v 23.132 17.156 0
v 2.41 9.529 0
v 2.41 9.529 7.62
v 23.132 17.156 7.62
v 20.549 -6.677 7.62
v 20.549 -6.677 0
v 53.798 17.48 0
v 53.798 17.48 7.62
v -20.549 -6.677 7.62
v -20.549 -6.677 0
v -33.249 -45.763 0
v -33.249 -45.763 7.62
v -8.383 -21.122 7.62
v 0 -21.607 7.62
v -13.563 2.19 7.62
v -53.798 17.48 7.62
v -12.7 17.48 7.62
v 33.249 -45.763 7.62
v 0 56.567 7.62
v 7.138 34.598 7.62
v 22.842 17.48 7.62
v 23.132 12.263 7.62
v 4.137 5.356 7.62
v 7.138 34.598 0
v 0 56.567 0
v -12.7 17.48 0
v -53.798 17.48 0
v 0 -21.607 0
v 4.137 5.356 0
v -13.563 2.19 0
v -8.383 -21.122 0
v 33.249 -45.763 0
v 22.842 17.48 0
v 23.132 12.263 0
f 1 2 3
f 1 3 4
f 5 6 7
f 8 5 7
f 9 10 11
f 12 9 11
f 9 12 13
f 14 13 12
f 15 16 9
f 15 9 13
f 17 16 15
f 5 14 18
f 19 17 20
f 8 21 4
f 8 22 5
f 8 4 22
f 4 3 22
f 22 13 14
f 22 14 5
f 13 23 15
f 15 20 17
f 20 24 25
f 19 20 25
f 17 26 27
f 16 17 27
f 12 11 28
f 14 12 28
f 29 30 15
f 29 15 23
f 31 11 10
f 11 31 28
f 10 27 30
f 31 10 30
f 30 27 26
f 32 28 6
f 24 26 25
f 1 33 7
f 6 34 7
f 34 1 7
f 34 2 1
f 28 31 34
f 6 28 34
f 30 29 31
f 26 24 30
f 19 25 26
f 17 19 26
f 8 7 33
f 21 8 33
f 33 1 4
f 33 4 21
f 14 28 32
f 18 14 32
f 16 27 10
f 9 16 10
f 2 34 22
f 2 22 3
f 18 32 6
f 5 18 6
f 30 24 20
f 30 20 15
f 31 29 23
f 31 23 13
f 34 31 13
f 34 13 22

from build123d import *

# Parameters (mm, degrees)
F1_DEPTH = 7.62
F3_DEPTH = 25.4


# Not quite as in the source:
# - ends of sketch curves that miss each other by under 0.0002 mm in the source are joined


with BuildPart() as f1:
    # F0 (on Top) → F1 (new body)
    with BuildSketch(Plane.XY):
        Polygon((0, 56.5666313121), (-12.7, 17.48005039), (12.7, 17.48005039), align=None)
        Polygon((12.7, 17.48005039), (-12.7, 17.48005039), (-20.5490316571, -6.6767851239), (0, -21.6065305321), (20.5490316571, -6.6767851239), align=None)
        Polygon((-20.5490316571, -6.6767851239), (-12.7, 17.48005039), (-53.7980635454, 17.48005039), align=None)
        Polygon((53.7980636, 17.48005039), (12.7, 17.48005039), (20.5490316571, -6.6767851239), align=None)
        Polygon((0, -21.6065305321), (-20.5490316571, -6.6767851239), (-33.2490320312, -45.7633663178), align=None)
        Polygon((33.2490317454, -45.7633663178), (20.5490316571, -6.6767851239), (0, -21.6065305321), align=None)
    extrude(amount=F1_DEPTH)

    # F2 (on Top) → F3 (cut)
    with BuildSketch(Plane.XY):
        Polygon((23.131839931, 17.1561446041), (7.3025235906, 34.8562002182), (-13.5633936152, 2.1902460139), (4.1366601363, 5.3561092354), (-8.3828903735, -21.1220216006), (23.131839931, 12.2634470463), (2.4098258, 9.5292925835), align=None)
    extrude(amount=F3_DEPTH, mode=Mode.SUBTRACT)


solid = f1.part
